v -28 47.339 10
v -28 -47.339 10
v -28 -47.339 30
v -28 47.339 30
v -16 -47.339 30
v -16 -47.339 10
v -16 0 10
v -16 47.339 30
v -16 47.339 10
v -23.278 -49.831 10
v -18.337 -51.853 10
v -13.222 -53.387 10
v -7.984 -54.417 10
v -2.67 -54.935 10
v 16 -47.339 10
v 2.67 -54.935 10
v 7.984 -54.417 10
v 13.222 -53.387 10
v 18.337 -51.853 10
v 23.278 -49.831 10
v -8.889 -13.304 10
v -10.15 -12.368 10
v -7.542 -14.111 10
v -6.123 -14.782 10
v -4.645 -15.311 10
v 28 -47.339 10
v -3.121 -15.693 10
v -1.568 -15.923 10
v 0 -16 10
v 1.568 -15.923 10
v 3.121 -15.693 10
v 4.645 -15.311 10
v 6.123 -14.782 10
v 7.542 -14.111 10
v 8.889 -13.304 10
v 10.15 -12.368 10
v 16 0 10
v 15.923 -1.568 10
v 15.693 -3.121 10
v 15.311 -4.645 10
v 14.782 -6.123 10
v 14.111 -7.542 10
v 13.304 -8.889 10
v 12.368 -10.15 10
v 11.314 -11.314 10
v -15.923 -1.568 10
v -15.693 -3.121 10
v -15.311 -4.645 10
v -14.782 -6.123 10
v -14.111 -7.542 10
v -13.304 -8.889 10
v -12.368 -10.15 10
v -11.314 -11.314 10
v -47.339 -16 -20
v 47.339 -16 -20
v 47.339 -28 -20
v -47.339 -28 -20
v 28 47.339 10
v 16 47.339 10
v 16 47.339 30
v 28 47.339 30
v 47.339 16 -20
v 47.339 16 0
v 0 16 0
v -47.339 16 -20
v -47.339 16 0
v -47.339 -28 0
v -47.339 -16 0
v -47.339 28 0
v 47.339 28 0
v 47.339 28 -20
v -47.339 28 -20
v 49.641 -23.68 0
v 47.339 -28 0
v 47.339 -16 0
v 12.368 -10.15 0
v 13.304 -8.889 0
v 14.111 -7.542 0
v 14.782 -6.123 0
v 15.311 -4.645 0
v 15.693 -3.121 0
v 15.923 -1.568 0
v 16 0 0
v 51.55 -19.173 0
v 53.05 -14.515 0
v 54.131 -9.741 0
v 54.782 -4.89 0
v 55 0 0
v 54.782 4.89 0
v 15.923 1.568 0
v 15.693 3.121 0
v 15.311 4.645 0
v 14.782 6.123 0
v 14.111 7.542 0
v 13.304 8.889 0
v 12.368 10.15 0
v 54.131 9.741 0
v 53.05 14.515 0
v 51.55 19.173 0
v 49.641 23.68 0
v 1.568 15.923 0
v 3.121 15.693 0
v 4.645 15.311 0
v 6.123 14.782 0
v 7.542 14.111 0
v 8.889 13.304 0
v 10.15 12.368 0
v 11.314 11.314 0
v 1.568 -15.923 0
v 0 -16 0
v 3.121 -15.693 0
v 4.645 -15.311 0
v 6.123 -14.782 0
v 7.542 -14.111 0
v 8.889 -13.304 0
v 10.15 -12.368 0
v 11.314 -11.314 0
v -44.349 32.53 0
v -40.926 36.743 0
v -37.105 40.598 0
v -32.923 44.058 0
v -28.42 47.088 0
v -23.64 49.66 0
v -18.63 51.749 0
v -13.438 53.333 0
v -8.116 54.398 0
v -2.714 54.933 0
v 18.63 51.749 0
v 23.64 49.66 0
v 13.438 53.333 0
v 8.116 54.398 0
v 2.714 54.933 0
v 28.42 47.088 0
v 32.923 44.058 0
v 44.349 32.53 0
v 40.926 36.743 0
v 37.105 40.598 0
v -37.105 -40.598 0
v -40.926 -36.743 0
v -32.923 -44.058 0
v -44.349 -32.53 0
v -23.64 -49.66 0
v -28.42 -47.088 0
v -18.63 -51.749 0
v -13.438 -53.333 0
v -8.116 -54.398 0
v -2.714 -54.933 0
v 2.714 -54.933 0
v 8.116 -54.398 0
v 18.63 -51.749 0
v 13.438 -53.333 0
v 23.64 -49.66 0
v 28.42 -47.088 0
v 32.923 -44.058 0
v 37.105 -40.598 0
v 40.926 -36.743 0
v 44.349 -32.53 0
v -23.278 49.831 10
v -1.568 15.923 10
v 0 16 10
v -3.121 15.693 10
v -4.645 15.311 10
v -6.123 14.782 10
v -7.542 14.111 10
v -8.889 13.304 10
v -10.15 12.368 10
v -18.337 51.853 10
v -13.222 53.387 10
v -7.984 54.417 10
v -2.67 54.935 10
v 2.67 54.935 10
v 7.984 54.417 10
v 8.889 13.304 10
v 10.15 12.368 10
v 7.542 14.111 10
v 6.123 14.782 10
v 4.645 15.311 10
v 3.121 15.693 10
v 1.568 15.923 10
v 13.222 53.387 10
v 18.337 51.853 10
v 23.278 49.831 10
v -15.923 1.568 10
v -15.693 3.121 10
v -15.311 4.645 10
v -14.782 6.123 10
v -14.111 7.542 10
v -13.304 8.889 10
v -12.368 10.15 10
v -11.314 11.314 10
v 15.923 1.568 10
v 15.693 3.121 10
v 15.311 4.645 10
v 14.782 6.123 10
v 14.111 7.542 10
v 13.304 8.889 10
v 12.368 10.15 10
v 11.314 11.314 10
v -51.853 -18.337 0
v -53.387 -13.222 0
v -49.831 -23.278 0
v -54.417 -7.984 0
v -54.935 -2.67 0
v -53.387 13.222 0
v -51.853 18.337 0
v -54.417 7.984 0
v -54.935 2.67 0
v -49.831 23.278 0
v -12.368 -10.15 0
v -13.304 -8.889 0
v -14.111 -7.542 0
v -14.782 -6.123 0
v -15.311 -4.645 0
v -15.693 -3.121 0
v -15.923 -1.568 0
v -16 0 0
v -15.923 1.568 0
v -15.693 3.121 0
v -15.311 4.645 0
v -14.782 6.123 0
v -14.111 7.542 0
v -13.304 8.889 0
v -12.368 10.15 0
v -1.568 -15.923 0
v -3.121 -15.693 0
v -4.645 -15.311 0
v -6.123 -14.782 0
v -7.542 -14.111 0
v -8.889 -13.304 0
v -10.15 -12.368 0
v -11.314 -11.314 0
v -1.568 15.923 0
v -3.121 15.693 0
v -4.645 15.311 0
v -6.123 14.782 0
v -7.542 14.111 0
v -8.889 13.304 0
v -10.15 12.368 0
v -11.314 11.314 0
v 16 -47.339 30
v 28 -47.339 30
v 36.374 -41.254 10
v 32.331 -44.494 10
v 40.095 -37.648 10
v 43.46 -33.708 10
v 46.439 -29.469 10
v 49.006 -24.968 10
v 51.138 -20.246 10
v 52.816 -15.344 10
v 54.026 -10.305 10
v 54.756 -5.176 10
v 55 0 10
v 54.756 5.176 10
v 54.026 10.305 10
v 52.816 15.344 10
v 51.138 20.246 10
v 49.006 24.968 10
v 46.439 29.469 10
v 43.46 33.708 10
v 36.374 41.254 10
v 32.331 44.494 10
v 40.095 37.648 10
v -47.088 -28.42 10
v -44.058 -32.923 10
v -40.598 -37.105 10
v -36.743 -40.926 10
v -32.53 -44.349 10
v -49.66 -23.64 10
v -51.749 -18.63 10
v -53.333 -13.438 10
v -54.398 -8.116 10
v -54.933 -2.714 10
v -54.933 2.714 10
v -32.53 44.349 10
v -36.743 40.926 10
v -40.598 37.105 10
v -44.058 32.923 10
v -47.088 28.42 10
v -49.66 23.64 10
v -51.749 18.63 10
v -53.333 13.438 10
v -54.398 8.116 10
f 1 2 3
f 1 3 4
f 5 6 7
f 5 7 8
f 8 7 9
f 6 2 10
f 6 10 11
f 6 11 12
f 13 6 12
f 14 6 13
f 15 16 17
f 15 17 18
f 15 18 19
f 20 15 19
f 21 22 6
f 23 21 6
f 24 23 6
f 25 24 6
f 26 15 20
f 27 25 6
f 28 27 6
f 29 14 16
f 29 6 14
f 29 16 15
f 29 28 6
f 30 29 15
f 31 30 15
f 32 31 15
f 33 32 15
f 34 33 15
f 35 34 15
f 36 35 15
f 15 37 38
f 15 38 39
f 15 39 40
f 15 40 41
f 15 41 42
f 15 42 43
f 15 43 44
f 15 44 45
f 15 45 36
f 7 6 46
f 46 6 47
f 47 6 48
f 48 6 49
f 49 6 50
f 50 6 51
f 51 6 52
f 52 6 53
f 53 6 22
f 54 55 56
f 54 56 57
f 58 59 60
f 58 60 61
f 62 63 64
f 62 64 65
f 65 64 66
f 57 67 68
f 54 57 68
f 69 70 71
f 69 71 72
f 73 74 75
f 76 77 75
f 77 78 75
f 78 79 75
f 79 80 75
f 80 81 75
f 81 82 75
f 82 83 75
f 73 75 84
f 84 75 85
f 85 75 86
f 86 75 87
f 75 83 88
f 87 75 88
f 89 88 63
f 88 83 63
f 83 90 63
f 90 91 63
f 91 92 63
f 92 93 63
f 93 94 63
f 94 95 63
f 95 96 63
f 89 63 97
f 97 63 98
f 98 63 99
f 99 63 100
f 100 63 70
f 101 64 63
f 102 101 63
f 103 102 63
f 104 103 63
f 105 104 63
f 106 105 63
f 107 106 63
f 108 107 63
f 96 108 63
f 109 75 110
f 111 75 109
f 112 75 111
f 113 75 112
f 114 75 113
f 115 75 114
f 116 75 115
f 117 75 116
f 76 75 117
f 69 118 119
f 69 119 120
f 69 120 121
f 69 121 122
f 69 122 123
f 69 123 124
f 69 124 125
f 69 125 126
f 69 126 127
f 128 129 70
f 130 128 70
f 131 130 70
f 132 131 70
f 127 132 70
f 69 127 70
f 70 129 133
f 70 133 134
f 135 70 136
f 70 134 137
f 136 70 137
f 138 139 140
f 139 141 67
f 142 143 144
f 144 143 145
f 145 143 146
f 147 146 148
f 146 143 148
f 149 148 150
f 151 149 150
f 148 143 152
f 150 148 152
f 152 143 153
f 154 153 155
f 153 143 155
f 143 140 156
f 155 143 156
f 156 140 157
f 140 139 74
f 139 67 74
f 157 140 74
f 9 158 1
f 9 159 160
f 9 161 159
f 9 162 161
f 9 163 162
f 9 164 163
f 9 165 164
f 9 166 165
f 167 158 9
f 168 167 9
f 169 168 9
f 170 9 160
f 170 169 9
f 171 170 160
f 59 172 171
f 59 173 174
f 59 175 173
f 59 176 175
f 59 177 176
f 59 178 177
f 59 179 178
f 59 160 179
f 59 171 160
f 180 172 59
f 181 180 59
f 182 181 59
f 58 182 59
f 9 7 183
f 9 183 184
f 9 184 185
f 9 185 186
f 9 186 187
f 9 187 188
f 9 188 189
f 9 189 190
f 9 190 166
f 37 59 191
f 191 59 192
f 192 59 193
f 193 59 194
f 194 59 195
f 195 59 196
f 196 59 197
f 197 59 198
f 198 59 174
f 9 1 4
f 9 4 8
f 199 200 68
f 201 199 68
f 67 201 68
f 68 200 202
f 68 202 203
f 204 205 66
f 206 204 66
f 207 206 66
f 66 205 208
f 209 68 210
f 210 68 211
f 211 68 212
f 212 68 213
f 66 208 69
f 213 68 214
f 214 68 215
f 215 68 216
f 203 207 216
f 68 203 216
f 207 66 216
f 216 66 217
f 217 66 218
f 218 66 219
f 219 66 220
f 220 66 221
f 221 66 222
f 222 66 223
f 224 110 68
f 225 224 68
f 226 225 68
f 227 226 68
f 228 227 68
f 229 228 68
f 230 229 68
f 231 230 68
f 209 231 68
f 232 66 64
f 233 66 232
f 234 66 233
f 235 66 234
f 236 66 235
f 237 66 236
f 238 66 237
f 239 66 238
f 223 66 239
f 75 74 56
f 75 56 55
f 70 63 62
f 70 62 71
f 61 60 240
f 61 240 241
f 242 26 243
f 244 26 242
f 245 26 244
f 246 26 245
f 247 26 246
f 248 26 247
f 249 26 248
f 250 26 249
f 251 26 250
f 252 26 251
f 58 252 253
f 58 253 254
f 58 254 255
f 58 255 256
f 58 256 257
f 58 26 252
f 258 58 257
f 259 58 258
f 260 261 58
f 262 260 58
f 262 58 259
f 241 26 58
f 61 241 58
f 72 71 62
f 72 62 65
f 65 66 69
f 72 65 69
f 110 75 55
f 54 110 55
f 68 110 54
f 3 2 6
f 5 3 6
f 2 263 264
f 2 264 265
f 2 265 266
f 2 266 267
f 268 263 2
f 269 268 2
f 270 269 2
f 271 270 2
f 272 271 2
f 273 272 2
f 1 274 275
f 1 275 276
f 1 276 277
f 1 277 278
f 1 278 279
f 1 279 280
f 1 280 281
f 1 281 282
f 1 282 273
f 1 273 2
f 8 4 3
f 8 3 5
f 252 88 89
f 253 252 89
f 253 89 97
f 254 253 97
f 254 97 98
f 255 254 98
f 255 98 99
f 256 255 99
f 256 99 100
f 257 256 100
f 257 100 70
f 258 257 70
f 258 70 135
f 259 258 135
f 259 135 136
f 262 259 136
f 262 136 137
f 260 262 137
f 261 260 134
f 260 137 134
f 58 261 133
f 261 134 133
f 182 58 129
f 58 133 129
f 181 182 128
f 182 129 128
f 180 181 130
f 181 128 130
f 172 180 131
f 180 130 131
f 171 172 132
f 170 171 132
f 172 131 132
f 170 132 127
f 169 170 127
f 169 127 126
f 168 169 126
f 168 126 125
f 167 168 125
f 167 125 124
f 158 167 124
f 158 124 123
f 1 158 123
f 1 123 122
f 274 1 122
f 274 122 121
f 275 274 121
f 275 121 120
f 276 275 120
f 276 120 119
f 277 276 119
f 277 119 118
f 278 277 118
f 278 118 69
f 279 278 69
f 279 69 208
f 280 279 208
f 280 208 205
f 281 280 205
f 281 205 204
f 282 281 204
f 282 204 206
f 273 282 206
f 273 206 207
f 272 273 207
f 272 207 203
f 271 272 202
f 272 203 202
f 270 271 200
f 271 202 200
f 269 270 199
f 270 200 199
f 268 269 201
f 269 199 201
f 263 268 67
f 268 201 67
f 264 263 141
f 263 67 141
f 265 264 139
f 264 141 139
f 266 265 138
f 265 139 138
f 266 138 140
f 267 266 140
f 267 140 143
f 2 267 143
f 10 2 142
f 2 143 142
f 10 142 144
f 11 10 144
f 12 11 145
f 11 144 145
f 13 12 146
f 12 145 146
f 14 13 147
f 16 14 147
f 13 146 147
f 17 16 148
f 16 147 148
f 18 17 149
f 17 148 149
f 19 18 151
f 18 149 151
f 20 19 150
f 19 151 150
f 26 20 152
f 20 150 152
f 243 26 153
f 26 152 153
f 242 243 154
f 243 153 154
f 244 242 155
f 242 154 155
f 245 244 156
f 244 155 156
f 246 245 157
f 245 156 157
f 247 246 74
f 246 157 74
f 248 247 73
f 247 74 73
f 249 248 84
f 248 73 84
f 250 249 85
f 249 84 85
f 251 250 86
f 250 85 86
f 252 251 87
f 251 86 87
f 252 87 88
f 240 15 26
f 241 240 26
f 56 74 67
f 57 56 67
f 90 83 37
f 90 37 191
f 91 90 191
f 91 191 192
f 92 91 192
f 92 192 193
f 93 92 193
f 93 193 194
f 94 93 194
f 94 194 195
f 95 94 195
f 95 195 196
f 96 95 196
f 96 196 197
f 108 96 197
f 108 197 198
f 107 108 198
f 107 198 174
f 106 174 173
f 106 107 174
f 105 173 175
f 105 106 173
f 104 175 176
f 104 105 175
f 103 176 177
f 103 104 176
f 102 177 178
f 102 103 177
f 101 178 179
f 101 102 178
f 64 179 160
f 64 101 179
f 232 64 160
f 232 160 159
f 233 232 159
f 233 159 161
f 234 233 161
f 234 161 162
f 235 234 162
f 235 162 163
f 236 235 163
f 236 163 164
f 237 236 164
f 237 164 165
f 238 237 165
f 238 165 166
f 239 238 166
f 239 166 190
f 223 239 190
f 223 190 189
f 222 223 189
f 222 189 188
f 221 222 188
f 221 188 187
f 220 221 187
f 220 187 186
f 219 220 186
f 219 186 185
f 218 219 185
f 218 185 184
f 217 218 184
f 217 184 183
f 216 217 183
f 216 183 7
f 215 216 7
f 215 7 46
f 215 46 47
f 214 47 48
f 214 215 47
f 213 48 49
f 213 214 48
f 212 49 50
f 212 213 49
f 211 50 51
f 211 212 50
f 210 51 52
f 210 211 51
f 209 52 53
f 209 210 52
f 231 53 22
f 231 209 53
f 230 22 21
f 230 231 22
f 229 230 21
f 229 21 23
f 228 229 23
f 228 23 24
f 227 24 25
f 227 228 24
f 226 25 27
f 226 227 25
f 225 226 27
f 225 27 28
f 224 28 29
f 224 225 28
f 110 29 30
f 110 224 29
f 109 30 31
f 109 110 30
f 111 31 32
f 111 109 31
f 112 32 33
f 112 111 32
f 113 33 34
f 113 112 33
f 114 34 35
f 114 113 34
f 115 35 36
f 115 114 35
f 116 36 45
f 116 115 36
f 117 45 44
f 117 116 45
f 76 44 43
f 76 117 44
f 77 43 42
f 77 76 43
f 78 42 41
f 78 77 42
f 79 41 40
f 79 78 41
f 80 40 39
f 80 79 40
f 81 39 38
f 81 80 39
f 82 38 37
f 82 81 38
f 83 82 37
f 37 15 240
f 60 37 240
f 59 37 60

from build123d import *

# Parameters (mm, degrees)
SZKIC1_R                    = 55
SZKIC1_R_2                  = 16
DODANIE_WYCI_GNI_CIE1_DEPTH = 10
SZKIC2_W                    = 12
SZKIC2_H                    = 94.678403028
DODANIE_WYCI_GNI_CIE2_DEPTH = 20
SZKIC3_W                    = 94.678403028
SZKIC3_H                    = 12
DODANIE_WYCI_GNI_CIE3_DEPTH = 20


with BuildPart() as part:
    # Szkic1 → Dodanie-wyciągnięcie1 (new body)
    with BuildSketch(Plane.XY):
        Circle(SZKIC1_R)
        Circle(SZKIC1_R_2, mode=Mode.SUBTRACT)
    extrude(amount=DODANIE_WYCI_GNI_CIE1_DEPTH)

    # Szkic2 → Dodanie-wyciągnięcie2 (add)
    with BuildSketch(Plane.XY.offset(10)):
        with Locations((-22, 0)):
            Rectangle(SZKIC2_W, SZKIC2_H)
        with Locations((22, 0)):
            Rectangle(SZKIC2_W, SZKIC2_H)
    extrude(amount=DODANIE_WYCI_GNI_CIE2_DEPTH)

    # Szkic3 → Dodanie-wyciągnięcie3 (add)
    with BuildSketch(Plane(origin=(0, 0, 0), x_dir=(-1, 0, 0), z_dir=(0, 0, -1))):
        with Locations((0, -22)):
            Rectangle(SZKIC3_W, SZKIC3_H)
        with Locations((0, 22)):
            Rectangle(SZKIC3_W, SZKIC3_H)
    extrude(amount=DODANIE_WYCI_GNI_CIE3_DEPTH)


solid = part.part
